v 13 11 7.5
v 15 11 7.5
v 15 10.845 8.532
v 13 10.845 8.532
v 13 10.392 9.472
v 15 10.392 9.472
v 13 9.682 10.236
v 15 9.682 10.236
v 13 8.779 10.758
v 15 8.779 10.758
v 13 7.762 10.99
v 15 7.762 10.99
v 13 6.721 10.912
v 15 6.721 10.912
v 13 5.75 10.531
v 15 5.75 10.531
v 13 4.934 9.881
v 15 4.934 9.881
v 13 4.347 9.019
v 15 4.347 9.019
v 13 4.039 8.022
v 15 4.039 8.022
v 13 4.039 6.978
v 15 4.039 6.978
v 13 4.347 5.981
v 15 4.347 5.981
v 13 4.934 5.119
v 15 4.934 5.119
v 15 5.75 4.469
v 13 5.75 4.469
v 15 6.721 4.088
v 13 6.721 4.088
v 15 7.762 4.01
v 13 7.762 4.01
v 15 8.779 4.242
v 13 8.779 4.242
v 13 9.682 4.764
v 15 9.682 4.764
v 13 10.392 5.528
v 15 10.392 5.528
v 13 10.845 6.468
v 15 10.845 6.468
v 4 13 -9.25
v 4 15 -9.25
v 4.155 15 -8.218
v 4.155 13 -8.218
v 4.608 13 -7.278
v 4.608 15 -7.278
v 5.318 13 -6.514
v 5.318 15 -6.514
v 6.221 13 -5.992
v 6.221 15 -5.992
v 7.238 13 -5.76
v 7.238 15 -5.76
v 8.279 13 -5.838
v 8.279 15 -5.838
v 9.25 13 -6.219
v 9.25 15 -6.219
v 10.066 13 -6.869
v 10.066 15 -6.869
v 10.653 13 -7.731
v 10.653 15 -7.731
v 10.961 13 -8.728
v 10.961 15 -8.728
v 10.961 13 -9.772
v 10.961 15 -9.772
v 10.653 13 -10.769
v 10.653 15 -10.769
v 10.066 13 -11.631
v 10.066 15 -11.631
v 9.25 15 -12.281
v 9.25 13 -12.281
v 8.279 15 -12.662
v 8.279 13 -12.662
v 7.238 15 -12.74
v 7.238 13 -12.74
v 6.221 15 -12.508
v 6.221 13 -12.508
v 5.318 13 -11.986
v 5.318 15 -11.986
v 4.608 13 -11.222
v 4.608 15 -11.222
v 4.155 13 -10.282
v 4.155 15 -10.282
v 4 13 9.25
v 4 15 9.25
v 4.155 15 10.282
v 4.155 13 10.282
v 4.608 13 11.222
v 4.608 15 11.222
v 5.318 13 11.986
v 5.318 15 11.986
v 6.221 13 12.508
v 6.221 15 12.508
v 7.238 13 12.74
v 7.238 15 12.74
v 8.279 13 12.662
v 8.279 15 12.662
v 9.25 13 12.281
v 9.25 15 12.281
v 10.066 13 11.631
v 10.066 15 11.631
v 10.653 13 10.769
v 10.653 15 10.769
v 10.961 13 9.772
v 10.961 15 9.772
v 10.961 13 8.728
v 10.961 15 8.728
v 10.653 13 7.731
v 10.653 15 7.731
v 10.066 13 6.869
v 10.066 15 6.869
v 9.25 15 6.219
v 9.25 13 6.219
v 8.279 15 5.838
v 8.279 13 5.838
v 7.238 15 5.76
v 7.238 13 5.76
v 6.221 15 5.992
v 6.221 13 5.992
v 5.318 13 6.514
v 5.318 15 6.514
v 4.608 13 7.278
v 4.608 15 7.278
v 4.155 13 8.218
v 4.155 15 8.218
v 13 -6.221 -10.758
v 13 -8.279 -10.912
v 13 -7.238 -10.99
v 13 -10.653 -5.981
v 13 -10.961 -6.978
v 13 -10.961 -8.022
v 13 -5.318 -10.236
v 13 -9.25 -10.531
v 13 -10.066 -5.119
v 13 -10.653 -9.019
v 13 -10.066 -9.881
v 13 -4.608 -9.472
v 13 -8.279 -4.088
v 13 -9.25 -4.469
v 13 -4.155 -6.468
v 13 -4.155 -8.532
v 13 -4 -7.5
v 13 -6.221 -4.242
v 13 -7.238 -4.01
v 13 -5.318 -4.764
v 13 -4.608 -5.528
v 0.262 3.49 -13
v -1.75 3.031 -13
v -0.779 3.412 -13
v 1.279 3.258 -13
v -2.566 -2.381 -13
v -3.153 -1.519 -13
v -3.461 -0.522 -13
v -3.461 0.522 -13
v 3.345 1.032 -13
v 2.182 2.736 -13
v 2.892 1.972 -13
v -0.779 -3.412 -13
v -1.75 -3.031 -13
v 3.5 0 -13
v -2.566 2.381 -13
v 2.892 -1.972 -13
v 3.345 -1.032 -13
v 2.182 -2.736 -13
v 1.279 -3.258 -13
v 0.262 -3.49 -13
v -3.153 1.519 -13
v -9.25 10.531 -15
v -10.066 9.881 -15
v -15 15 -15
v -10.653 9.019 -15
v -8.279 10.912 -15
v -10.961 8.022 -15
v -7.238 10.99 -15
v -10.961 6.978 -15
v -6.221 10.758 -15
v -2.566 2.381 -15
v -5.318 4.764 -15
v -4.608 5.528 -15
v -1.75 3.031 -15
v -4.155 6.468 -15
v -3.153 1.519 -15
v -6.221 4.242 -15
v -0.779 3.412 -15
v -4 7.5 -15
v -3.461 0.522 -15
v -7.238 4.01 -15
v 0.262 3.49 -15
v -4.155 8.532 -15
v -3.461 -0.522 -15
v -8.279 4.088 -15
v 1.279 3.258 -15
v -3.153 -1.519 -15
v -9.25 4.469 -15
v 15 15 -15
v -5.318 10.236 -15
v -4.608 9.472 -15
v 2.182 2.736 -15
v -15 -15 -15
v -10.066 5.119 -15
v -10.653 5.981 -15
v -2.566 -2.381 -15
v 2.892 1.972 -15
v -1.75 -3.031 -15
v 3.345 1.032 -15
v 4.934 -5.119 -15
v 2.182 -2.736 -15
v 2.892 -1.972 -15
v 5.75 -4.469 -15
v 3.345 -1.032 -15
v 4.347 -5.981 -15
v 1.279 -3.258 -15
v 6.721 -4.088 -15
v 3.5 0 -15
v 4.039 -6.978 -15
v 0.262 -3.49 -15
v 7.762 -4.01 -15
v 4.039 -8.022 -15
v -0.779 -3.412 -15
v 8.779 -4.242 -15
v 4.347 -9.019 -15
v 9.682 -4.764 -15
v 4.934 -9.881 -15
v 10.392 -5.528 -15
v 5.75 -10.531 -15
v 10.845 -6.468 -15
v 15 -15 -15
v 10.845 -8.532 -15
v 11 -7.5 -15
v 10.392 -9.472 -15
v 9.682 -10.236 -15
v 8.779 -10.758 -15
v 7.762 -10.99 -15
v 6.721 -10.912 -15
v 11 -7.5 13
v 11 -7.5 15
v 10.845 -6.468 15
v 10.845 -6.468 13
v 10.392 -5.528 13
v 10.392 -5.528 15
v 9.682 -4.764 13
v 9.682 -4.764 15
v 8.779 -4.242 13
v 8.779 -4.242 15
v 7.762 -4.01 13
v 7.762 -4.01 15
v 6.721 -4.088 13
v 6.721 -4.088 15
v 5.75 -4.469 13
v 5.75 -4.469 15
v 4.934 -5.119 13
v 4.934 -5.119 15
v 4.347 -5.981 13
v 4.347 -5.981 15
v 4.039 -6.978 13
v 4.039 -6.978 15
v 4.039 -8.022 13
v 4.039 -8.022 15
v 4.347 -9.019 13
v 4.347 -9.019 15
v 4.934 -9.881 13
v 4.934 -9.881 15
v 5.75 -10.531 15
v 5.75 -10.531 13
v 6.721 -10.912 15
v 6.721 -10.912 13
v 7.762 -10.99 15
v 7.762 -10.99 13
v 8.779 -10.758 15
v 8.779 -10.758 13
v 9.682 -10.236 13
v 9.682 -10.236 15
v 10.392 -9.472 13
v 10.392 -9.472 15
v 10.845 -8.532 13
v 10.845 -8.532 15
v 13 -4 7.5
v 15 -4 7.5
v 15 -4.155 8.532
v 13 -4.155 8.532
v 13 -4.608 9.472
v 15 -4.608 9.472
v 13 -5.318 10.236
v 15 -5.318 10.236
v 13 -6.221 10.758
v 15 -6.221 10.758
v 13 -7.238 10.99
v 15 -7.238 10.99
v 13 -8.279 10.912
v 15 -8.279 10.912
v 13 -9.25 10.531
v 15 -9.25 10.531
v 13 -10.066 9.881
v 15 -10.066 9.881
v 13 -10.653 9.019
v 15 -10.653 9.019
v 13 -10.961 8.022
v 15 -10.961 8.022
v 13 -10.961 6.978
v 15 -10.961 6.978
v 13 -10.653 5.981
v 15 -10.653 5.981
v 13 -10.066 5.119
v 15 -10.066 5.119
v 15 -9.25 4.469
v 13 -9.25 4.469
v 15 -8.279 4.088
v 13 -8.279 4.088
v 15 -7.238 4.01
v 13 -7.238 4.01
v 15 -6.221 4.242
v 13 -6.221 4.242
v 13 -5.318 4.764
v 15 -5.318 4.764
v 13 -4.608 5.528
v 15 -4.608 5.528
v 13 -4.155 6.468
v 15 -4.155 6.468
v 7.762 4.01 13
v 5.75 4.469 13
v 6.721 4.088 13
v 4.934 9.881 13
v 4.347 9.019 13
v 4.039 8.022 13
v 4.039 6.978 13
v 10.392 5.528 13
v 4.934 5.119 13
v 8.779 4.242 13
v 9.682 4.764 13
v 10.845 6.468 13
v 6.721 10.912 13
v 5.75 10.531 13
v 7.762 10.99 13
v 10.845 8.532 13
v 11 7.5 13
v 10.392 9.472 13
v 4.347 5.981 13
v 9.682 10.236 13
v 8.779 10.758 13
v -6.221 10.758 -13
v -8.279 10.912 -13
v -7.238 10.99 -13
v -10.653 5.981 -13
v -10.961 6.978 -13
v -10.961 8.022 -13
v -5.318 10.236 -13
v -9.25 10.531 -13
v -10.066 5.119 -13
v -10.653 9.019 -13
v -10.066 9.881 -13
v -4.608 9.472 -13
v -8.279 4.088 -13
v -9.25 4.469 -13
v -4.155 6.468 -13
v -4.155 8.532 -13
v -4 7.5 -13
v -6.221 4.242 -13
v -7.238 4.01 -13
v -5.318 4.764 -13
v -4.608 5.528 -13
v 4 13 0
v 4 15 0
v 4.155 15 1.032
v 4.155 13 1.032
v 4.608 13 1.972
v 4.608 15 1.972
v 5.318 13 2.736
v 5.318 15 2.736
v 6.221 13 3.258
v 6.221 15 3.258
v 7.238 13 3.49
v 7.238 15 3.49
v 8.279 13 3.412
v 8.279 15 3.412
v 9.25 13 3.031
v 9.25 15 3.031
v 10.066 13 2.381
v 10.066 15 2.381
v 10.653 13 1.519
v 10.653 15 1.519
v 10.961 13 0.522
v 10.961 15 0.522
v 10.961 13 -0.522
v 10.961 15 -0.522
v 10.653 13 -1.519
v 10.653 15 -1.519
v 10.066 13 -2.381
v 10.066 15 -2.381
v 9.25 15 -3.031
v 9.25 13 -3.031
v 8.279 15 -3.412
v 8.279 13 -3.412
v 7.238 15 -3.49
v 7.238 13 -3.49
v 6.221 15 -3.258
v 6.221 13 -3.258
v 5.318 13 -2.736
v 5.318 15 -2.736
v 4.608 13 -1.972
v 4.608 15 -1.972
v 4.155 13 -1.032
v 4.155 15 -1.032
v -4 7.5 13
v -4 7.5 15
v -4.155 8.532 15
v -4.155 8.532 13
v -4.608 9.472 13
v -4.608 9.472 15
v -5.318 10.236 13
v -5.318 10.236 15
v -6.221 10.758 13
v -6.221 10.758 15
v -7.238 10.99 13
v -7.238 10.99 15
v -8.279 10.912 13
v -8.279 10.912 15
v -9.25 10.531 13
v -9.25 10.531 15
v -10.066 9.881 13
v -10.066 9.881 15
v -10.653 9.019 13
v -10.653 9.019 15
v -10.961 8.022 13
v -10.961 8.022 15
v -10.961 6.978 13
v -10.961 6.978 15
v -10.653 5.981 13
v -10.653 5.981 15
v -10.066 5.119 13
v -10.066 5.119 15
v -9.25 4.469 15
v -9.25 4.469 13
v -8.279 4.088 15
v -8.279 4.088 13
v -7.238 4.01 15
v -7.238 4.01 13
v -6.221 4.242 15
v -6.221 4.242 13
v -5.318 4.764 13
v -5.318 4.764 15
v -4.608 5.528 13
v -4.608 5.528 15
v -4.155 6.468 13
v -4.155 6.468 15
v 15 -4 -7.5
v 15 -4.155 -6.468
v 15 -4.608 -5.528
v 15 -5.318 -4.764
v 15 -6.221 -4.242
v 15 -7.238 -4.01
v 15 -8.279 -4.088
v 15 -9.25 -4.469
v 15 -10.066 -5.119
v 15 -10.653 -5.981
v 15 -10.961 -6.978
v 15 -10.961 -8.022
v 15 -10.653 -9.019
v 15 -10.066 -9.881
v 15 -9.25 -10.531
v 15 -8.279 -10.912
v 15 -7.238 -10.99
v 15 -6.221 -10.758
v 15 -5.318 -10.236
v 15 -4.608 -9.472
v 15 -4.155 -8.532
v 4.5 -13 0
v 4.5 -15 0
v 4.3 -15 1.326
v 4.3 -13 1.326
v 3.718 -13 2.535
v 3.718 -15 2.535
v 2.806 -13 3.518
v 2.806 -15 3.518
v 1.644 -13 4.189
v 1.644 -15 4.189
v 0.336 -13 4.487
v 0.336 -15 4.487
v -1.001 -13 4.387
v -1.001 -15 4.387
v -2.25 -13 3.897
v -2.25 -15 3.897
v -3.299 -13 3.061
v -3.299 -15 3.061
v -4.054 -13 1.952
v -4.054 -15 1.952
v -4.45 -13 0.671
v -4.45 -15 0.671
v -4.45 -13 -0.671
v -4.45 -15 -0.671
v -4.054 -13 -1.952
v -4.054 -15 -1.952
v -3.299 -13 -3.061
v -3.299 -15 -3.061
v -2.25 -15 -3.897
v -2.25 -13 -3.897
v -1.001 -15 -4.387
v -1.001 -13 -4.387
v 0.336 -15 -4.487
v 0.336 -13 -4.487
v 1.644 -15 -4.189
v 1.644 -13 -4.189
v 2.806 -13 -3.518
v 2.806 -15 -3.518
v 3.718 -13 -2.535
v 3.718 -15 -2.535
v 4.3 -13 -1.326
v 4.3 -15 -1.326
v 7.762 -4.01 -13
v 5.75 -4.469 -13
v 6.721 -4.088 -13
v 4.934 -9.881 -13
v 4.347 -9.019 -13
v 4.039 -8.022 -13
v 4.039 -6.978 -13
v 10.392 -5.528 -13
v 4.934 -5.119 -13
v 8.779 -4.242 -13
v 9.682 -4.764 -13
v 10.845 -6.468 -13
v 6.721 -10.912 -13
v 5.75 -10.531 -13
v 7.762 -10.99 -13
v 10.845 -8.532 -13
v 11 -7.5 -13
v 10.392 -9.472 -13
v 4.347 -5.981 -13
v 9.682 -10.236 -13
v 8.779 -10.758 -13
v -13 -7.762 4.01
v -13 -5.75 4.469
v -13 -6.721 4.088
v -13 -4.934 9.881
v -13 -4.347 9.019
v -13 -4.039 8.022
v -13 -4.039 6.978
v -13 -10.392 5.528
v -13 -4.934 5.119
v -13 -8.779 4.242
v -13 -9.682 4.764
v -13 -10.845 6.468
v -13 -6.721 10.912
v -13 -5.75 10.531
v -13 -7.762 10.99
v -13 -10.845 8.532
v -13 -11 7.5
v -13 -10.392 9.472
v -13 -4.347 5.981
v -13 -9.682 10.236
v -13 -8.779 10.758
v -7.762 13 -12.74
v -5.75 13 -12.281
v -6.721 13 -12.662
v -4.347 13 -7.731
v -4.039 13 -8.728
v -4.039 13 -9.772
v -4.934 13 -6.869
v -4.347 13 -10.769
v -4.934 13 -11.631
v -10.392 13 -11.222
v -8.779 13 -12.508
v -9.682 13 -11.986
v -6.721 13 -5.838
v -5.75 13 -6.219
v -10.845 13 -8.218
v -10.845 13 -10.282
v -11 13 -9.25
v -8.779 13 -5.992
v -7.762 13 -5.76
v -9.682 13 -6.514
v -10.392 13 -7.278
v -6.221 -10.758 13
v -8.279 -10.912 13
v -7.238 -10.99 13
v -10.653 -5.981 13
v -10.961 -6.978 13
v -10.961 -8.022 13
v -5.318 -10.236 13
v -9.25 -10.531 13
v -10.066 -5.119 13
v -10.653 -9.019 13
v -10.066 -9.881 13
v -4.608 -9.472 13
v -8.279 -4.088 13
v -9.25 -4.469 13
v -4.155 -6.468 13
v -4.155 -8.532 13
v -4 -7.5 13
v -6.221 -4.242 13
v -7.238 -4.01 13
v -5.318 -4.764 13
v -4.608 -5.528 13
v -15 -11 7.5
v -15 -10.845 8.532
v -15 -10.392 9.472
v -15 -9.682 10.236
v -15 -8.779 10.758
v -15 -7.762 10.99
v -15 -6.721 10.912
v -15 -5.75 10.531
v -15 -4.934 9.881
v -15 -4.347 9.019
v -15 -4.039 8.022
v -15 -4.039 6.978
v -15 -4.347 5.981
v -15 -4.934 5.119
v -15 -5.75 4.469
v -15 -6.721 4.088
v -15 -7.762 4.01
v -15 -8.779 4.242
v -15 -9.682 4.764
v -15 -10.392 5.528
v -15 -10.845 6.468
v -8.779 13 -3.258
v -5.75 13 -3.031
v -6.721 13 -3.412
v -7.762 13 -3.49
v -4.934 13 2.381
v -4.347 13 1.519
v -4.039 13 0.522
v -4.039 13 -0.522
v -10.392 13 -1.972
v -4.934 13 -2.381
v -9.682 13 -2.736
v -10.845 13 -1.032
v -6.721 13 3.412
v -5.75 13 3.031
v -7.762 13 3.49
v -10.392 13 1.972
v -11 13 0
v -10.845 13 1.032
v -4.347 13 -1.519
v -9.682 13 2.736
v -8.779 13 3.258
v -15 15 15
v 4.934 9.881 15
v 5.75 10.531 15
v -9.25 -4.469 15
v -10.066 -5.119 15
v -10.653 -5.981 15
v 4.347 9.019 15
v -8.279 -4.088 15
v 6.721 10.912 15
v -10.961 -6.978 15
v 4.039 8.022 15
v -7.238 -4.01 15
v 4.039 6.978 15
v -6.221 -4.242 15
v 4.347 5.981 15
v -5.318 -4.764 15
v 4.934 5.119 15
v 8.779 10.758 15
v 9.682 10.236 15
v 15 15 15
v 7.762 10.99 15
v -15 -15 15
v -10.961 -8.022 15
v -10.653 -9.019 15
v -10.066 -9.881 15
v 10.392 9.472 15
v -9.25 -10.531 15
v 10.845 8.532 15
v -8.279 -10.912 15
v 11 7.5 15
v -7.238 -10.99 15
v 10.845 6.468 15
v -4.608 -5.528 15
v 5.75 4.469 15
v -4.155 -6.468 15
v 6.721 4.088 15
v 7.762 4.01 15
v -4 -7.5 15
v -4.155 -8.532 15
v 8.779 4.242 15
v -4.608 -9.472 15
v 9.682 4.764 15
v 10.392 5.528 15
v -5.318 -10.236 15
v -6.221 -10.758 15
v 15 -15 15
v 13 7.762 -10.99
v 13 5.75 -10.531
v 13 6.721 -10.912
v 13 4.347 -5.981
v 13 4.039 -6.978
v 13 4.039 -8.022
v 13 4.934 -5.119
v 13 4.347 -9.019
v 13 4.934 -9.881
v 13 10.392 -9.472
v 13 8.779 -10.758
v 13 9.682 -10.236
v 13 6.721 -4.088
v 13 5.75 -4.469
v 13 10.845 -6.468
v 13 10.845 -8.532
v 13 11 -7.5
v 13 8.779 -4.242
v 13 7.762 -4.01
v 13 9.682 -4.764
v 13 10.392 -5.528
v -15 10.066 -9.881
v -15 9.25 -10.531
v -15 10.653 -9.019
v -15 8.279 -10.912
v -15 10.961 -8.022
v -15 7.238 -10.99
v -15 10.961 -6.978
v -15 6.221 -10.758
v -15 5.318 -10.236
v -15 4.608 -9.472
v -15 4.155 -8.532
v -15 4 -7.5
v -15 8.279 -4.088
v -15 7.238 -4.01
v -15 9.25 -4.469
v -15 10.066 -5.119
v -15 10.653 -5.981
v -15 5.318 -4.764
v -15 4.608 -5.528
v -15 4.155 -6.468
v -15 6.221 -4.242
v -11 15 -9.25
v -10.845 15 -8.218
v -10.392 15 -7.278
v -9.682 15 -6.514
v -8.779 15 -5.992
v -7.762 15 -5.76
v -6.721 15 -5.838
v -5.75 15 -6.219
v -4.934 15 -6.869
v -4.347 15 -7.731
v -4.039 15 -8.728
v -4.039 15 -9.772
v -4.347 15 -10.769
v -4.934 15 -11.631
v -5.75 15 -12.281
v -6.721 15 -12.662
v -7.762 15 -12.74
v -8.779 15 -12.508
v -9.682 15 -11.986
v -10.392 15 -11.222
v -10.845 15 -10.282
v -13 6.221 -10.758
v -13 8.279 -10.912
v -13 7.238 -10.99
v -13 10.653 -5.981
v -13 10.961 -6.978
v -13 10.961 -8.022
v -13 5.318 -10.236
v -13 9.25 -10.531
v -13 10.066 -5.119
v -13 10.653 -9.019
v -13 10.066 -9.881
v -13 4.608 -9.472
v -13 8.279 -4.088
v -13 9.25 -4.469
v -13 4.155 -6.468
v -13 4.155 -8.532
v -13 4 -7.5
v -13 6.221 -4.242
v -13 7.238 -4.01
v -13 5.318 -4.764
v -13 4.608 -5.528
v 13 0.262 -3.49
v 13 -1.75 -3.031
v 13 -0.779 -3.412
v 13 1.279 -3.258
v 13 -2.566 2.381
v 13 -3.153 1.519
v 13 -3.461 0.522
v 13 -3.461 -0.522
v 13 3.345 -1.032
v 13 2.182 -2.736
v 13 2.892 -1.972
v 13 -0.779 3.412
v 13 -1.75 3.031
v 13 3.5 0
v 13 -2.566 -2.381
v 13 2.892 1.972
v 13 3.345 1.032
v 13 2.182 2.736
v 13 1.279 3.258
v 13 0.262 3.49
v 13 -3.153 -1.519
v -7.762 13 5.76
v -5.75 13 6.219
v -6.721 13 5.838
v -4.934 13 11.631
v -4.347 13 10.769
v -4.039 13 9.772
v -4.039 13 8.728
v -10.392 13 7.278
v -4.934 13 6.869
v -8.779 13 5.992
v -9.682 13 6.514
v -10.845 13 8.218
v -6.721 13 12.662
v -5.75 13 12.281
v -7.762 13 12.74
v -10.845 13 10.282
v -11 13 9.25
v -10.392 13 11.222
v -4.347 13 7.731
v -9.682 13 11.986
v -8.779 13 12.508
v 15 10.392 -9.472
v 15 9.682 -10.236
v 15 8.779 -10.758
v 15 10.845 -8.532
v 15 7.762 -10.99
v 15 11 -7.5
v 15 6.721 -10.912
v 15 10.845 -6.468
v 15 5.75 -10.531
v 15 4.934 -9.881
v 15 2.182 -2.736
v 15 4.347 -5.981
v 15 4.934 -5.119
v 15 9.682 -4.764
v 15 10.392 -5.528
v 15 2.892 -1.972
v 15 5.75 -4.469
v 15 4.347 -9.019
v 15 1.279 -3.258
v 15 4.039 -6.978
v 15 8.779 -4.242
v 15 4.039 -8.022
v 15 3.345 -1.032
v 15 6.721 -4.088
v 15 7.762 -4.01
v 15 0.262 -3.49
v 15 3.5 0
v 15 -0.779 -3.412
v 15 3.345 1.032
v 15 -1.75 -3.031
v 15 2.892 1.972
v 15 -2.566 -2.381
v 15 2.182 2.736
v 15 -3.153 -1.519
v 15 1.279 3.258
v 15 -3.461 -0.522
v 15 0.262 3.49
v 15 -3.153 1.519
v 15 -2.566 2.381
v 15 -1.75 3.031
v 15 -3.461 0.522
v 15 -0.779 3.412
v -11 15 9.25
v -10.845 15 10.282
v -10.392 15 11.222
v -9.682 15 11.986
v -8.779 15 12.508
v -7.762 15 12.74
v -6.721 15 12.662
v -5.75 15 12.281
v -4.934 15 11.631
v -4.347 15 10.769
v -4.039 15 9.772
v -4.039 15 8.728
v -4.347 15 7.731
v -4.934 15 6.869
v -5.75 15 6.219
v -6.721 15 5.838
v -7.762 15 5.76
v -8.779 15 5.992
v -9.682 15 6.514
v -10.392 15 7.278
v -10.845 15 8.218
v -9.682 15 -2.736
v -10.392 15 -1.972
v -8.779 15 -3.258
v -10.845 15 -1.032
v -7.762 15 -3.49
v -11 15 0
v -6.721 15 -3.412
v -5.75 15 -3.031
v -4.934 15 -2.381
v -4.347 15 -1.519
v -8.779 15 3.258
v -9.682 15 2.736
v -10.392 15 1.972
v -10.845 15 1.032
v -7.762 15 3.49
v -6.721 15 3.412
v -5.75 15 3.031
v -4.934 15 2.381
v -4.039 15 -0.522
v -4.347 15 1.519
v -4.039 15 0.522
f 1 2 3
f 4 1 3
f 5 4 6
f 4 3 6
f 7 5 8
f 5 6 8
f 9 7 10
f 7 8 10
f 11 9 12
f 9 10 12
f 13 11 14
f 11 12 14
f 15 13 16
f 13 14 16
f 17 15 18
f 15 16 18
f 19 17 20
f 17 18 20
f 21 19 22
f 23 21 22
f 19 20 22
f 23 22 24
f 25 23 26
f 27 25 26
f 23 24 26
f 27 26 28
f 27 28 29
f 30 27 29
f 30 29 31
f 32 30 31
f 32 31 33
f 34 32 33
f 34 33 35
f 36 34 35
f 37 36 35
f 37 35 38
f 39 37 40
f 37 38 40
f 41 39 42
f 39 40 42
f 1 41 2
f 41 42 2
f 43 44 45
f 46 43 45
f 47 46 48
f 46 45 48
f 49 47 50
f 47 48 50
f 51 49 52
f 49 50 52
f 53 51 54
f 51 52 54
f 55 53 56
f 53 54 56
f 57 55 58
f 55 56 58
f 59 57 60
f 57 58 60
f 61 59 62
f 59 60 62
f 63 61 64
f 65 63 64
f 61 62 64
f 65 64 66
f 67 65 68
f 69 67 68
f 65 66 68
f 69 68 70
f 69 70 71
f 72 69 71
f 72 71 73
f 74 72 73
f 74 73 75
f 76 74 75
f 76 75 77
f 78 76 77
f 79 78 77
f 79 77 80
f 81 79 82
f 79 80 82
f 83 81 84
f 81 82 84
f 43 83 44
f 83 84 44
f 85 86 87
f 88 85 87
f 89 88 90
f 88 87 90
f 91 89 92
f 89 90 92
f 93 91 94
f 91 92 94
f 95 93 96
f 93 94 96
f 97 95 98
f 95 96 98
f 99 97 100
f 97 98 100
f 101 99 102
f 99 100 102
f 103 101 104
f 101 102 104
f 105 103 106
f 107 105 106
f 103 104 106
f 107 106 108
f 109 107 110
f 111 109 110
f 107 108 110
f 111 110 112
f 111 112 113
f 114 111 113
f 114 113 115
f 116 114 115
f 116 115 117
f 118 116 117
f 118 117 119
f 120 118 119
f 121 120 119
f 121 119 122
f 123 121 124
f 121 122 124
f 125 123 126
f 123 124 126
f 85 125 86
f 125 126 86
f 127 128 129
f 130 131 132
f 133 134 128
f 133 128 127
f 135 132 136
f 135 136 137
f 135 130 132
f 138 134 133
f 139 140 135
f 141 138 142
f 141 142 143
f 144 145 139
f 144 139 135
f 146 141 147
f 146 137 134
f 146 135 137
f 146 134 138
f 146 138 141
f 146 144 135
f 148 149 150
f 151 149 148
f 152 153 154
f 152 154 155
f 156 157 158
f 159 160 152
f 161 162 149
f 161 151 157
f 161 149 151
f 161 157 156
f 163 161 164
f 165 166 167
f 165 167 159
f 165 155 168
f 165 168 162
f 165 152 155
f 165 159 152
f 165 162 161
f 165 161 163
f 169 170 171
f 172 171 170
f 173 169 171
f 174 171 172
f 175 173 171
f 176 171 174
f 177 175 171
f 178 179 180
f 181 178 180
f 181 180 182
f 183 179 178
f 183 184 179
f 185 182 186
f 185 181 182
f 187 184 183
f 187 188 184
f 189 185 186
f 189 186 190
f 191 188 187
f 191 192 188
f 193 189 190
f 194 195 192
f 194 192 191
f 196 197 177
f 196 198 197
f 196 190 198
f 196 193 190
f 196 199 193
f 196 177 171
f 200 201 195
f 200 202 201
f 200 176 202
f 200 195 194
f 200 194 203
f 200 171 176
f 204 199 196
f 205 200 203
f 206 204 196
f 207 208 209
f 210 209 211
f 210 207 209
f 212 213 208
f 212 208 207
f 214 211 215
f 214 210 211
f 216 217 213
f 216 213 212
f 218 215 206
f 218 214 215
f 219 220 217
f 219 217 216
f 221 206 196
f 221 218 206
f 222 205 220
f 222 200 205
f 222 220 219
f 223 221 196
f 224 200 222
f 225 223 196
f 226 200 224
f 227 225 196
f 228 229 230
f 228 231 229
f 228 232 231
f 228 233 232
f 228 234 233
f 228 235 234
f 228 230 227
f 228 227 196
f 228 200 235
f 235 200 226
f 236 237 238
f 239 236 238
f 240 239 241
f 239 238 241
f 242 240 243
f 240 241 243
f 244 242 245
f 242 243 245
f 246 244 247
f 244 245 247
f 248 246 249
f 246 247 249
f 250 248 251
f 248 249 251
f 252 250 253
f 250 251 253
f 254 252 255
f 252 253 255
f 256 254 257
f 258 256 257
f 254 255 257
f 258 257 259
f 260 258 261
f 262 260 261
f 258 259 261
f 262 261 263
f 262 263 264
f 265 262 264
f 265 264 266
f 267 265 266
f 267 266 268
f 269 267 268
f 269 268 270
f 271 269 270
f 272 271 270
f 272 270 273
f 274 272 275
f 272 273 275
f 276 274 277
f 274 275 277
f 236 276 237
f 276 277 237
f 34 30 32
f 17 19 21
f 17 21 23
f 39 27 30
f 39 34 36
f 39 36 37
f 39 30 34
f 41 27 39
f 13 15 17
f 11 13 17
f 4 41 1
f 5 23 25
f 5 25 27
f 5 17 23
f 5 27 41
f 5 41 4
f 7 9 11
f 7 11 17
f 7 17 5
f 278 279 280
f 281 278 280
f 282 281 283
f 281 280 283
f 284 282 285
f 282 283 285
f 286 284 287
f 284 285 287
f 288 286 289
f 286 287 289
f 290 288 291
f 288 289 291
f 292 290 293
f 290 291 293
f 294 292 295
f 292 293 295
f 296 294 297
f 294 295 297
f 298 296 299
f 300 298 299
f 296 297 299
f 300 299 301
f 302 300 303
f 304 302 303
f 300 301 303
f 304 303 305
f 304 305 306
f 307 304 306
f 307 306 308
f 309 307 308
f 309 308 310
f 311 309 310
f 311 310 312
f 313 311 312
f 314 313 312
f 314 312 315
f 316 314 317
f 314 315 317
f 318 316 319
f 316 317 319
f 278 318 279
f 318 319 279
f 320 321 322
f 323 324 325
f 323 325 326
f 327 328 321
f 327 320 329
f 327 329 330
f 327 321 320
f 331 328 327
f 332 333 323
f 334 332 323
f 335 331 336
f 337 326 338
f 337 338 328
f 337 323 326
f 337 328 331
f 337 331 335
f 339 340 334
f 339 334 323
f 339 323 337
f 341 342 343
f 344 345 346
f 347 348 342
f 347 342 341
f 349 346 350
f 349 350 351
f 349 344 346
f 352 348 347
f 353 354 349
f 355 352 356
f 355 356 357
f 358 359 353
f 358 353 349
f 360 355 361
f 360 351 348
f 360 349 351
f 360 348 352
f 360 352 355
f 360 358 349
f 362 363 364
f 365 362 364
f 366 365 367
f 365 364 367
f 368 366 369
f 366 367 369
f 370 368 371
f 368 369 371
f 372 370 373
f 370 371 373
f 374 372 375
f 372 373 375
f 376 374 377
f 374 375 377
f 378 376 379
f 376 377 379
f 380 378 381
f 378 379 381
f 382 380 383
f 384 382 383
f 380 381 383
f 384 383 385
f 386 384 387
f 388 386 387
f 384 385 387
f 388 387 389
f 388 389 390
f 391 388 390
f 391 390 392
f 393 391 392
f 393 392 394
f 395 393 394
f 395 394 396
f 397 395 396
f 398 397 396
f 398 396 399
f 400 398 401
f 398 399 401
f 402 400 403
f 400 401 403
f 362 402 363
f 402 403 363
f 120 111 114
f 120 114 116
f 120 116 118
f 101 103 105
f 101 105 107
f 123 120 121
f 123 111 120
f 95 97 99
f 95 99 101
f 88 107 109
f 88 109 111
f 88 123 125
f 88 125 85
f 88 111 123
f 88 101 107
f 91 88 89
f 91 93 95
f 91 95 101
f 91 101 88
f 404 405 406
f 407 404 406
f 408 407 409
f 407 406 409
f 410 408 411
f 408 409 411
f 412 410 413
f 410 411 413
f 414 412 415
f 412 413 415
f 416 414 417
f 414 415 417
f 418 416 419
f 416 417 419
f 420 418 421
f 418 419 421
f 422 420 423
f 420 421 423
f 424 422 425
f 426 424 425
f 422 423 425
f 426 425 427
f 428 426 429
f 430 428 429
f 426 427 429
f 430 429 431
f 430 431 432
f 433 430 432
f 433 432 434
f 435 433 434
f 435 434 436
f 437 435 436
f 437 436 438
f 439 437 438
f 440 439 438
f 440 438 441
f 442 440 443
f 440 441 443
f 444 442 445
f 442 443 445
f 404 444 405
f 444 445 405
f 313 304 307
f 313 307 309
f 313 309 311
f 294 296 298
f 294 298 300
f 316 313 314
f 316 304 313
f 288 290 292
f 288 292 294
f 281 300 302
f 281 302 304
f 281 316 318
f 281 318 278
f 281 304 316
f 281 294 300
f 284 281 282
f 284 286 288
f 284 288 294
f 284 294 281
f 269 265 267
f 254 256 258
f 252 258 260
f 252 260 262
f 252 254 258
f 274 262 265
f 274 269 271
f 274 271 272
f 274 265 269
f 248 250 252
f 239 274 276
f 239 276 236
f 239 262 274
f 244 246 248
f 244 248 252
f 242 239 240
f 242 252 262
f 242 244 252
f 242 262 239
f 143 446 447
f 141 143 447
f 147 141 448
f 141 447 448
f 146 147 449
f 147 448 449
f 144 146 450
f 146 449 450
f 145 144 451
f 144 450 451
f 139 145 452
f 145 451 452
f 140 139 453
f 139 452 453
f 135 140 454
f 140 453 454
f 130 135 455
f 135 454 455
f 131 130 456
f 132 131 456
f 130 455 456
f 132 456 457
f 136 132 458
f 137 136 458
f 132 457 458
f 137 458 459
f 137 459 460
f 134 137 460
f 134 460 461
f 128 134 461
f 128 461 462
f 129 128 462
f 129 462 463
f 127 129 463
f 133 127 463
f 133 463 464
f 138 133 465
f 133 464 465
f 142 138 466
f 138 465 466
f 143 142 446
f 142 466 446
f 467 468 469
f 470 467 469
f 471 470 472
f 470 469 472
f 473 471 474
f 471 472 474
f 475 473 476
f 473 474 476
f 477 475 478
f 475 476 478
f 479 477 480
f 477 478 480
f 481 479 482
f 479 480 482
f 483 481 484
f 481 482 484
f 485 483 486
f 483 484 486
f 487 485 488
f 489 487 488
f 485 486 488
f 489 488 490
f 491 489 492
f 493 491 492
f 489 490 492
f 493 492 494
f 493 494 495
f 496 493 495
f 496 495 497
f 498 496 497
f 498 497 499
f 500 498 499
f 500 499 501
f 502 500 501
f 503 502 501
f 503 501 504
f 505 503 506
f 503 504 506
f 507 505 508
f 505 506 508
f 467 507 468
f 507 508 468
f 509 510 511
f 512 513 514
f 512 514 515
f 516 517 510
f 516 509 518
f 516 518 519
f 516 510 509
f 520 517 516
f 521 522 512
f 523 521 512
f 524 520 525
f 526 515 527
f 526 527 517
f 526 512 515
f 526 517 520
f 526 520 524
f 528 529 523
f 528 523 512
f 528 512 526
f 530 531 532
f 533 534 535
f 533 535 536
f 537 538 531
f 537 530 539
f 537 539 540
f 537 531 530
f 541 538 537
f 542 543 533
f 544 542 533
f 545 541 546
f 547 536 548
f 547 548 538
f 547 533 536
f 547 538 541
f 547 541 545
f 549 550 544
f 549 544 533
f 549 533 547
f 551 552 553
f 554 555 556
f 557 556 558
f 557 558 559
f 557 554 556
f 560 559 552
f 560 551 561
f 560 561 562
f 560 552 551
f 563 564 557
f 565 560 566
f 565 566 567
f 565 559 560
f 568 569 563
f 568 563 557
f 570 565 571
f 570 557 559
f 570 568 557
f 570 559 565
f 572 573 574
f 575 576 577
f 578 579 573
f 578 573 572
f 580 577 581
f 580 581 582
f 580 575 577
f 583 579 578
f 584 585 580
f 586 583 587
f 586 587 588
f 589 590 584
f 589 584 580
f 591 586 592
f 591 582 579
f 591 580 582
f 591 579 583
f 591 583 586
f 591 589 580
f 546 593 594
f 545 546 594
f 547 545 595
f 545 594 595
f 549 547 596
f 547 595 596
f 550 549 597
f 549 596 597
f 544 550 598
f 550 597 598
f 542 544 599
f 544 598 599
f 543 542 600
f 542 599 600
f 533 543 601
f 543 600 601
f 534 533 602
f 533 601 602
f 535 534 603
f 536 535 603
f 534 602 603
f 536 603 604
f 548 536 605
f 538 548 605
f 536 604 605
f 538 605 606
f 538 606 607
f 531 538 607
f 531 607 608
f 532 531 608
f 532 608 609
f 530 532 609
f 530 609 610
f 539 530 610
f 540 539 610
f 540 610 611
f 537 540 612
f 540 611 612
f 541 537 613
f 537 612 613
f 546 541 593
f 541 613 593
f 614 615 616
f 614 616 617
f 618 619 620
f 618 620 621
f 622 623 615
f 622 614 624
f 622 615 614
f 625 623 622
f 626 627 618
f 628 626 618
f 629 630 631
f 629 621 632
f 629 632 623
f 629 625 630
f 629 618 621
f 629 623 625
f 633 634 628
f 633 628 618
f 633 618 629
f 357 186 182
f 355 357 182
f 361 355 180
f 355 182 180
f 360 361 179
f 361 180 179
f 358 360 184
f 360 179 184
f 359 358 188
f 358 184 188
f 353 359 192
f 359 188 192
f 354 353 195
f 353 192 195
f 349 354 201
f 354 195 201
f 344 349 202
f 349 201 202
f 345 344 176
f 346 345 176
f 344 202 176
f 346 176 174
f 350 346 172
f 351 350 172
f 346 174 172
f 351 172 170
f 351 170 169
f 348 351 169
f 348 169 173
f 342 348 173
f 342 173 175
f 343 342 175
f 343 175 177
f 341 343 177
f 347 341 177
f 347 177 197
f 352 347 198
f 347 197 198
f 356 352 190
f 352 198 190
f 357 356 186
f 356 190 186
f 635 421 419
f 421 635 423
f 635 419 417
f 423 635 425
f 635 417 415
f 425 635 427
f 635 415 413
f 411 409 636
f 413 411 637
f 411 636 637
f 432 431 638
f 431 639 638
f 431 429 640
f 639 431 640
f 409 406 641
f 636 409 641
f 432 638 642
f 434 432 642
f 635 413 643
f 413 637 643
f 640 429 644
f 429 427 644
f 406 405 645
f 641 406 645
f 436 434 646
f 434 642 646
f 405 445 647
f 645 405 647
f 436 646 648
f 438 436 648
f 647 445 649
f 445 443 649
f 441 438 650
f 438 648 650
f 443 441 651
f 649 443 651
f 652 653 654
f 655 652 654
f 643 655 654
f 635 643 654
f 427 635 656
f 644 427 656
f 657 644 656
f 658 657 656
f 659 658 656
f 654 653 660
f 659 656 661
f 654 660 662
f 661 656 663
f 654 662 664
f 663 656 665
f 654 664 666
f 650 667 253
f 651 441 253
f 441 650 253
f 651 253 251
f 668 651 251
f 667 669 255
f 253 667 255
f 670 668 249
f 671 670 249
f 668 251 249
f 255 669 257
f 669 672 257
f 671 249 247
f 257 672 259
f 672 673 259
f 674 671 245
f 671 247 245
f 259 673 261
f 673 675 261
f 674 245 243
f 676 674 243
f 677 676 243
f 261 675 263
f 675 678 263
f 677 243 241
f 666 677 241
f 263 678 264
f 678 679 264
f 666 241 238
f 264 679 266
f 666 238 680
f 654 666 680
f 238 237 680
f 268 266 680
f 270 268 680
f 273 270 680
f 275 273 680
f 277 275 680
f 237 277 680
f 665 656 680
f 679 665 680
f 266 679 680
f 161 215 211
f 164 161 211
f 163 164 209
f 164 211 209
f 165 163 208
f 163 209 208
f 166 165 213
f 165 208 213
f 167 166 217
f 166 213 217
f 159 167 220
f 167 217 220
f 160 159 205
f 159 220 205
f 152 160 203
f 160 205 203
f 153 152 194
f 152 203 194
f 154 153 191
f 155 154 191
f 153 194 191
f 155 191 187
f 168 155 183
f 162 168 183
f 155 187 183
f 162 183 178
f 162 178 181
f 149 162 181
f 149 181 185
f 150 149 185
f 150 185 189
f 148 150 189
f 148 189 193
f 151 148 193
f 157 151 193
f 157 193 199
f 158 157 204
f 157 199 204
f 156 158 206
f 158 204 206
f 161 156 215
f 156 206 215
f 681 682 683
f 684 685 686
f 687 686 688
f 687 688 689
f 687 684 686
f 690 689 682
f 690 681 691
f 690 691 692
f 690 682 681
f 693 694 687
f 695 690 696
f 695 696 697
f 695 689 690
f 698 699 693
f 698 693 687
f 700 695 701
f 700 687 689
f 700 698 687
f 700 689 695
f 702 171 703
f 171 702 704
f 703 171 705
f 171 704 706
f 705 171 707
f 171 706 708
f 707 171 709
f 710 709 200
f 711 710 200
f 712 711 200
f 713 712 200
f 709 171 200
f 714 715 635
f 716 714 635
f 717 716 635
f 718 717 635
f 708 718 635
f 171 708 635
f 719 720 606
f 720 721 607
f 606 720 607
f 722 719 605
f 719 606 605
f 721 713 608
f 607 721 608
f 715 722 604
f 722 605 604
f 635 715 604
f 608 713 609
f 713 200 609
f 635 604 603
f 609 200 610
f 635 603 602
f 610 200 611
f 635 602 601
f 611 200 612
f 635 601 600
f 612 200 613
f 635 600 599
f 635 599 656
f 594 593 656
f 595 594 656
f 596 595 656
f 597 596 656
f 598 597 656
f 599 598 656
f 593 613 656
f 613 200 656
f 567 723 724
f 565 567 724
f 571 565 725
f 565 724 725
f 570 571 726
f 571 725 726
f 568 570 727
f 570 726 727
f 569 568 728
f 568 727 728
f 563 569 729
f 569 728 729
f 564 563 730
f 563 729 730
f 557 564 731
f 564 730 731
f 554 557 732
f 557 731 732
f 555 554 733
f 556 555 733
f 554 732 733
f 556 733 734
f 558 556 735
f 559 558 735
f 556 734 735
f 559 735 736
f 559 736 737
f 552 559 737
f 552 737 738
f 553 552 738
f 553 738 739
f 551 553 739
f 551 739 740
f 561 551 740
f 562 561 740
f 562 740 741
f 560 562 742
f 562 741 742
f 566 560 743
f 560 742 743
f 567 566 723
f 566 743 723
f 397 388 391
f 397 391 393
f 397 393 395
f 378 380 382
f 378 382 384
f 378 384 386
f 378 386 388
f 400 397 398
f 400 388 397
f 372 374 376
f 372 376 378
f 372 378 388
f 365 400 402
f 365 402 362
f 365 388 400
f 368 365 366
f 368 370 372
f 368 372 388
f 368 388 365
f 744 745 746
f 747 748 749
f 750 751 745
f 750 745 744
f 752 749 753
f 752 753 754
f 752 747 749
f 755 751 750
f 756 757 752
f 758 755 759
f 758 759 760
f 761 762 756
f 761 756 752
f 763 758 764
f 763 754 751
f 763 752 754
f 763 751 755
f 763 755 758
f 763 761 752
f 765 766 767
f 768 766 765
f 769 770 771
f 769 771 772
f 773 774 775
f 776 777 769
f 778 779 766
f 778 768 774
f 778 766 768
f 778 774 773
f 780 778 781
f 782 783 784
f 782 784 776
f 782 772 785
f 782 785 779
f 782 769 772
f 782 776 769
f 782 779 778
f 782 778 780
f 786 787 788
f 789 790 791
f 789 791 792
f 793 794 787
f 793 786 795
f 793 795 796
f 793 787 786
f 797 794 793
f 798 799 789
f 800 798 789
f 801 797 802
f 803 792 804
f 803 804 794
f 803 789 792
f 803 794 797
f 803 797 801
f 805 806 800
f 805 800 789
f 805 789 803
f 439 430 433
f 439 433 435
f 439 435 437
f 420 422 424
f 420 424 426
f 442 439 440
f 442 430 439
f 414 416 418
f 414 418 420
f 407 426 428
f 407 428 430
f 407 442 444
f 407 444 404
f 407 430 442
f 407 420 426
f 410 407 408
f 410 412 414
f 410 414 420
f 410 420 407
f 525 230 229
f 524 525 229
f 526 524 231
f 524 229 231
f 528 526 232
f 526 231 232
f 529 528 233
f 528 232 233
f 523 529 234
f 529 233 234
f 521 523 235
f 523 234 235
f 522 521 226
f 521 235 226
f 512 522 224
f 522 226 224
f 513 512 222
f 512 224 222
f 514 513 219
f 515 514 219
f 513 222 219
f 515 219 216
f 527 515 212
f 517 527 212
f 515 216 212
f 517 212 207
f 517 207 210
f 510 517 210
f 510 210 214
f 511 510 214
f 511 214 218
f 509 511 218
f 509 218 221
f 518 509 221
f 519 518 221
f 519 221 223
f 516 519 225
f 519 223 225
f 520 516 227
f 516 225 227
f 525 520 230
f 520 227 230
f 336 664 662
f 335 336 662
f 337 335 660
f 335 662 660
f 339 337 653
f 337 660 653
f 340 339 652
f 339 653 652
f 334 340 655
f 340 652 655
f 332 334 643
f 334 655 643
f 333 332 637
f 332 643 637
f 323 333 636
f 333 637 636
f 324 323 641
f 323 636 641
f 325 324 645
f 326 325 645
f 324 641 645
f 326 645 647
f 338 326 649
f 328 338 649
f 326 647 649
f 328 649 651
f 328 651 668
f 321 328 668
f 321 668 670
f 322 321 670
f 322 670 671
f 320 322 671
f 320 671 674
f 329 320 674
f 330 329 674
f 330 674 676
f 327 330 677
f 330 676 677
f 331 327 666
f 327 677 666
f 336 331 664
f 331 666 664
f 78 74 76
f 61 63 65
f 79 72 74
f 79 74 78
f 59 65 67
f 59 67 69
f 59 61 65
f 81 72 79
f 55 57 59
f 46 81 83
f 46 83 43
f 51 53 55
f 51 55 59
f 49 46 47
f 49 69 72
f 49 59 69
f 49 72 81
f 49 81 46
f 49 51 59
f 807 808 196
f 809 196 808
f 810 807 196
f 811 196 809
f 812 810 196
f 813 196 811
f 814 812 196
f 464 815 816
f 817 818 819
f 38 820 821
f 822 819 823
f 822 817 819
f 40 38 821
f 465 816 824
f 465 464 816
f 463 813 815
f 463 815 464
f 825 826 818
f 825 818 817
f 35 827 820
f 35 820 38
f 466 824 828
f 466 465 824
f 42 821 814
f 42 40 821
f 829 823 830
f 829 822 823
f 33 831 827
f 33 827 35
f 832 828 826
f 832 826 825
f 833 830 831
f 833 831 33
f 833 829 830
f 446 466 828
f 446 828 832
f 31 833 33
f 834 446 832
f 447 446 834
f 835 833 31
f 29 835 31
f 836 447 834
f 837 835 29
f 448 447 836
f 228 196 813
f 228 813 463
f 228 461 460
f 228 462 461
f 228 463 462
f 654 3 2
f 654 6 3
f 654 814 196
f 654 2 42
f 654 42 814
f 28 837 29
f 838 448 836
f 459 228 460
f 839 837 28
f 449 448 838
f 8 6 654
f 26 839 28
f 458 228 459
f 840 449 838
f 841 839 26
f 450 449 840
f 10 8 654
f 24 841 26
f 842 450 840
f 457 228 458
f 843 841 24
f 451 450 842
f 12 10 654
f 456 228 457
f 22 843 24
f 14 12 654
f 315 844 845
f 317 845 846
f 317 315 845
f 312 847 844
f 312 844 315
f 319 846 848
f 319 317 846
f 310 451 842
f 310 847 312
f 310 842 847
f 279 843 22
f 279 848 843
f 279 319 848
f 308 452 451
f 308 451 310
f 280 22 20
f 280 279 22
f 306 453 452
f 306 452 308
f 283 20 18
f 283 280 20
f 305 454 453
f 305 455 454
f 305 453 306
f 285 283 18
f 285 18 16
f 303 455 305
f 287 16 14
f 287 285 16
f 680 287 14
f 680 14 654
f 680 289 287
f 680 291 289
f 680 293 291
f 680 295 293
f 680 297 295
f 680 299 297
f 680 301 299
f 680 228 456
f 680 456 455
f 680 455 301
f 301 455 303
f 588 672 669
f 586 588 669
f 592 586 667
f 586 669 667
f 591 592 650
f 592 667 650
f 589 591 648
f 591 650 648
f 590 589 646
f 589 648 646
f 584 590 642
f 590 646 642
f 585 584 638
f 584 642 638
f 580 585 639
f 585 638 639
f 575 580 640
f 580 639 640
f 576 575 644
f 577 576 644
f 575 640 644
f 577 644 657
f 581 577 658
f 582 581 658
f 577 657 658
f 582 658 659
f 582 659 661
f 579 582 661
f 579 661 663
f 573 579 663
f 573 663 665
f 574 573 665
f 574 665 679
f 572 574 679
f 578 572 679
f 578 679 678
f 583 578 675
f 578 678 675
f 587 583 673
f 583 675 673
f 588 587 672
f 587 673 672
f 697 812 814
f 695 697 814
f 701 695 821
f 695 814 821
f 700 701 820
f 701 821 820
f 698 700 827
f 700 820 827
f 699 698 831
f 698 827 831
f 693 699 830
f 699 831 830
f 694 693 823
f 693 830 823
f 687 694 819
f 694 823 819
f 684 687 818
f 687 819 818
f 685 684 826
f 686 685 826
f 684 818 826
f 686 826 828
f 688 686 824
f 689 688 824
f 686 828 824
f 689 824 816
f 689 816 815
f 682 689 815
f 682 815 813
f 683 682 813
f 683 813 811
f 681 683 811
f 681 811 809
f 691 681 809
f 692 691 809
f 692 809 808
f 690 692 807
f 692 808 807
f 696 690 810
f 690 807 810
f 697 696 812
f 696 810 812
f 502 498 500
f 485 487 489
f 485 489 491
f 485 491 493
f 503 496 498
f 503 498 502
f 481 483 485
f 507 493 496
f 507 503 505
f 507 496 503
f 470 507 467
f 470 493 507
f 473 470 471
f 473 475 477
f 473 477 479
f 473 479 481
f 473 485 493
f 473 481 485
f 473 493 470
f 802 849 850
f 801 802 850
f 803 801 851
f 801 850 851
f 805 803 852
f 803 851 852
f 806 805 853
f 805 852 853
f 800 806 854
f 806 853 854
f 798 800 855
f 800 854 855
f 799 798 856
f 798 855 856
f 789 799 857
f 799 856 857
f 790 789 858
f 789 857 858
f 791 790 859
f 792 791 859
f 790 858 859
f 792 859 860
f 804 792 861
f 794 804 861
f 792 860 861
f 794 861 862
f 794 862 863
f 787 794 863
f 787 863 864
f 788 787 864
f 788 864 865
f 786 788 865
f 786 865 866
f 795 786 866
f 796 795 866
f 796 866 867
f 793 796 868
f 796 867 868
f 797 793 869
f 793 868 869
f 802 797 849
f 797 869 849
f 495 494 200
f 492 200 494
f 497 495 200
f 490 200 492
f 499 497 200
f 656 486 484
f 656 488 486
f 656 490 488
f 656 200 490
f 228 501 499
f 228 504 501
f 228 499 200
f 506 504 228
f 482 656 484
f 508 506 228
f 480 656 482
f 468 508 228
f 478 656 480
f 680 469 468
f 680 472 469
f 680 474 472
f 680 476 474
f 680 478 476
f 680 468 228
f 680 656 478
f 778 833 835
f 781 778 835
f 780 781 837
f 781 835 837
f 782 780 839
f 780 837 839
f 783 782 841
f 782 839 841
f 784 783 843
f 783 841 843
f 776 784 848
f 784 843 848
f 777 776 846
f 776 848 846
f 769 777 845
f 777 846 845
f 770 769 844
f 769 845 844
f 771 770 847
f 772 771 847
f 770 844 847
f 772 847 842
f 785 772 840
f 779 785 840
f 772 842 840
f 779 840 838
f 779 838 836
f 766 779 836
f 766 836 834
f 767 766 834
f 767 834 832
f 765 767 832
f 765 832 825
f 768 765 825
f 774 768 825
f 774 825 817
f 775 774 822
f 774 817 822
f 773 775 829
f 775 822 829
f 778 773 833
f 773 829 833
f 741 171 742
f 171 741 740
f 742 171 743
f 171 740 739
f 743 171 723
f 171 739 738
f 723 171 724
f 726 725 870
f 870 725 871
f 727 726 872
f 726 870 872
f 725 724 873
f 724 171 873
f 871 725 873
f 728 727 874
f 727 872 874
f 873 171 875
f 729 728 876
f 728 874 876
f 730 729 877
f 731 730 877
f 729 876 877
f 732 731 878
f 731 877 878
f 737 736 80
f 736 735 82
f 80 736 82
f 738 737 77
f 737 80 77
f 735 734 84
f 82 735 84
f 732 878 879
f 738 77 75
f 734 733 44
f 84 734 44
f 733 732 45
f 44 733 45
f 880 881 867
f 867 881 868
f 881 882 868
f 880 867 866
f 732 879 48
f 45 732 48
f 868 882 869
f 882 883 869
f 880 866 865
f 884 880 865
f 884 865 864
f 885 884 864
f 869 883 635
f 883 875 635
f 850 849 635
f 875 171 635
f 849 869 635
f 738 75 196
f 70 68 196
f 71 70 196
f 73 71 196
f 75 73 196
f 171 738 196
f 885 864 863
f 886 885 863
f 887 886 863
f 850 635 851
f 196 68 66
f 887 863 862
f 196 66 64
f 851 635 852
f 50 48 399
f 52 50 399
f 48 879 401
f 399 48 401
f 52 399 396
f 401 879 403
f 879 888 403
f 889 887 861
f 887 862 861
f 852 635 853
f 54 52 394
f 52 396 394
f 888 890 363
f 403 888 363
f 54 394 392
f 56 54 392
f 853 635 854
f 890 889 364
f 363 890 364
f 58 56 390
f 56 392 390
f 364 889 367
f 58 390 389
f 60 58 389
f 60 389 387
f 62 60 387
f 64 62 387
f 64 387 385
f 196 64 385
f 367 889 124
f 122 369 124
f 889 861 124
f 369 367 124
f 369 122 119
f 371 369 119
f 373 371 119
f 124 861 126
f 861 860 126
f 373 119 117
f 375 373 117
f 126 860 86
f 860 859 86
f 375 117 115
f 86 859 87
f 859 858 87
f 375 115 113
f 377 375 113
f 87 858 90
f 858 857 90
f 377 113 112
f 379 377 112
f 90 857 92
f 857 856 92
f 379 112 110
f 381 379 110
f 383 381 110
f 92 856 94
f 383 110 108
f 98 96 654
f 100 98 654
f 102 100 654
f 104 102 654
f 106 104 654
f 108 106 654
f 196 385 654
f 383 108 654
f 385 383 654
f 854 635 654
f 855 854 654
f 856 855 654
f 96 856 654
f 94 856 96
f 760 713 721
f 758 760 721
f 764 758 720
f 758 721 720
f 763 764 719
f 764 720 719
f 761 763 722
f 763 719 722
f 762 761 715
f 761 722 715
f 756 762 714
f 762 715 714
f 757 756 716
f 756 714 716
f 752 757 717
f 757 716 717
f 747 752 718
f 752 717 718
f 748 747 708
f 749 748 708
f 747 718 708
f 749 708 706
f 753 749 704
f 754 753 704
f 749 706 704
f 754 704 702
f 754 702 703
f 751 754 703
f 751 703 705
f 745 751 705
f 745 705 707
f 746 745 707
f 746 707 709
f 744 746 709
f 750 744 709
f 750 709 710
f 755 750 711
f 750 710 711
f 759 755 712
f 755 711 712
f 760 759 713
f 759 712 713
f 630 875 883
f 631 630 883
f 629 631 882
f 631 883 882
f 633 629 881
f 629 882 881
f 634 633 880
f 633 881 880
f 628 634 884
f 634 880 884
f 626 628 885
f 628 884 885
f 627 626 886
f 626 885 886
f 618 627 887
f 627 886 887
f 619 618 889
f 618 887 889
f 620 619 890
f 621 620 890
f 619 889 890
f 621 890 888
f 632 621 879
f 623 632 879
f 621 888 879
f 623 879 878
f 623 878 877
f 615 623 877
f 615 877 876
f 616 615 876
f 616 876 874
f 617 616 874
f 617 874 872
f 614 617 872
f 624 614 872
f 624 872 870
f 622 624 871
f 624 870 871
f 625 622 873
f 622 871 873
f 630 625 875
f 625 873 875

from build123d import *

# Parameters (mm, degrees)
F0_W      = 30
F0_H      = 30
F1_DEPTH  = 15
F2_R      = 4.5
F3_DEPTH  = 2
F5_R      = 3.5
F6_DEPTH  = 2
F7_R      = 3.5
F8_DEPTH  = 2
F9_R      = 3.5
F10_DEPTH = 2
F11_R     = 3.5
F12_DEPTH = 2
F13_R     = 3.5
F14_DEPTH = 2


with BuildPart() as f1:
    # F0 (on Front) → F1 (new body, symmetric)
    with BuildSketch(Plane.XZ):
        Rectangle(F0_W, F0_H)
    extrude(amount=F1_DEPTH, both=True)

    # F2 (on face) → F3 (cut)
    with BuildSketch(Plane.XZ.offset(15)):
        Circle(F2_R)
    extrude(amount=-F3_DEPTH, mode=Mode.SUBTRACT)

    # F5 (on face) → F6 (cut)
    with BuildSketch(Plane(origin=(0, 15, 0), x_dir=(-1, 0, 0), z_dir=(0, 1, 0))):
        with Locations((-7.5, 0)):
            Circle(F5_R)
        with Locations((-7.5, 9.25)):
            Circle(F5_R)
        with Locations((-7.5, -9.25)):
            Circle(F5_R)
        with Locations((7.5, 0)):
            Circle(F5_R)
        with Locations((7.5, -9.25)):
            Circle(F5_R)
        with Locations((7.5, 9.25)):
            Circle(F5_R)
    extrude(amount=-F6_DEPTH, mode=Mode.SUBTRACT)

    # F7 (on face) → F8 (cut)
    with BuildSketch(Plane.XY.offset(15)):
        with Locations((-7.5, 7.5)):
            Circle(F7_R)
        with Locations((7.5, 7.5)):
            Circle(F7_R)
        with Locations((7.5, -7.5)):
            Circle(F7_R)
        with Locations((-7.5, -7.5)):
            Circle(F7_R)
    extrude(amount=-F8_DEPTH, mode=Mode.SUBTRACT)

    # F9 (on face) → F10 (cut)
    with BuildSketch(Plane(origin=(0, 0, -15), x_dir=(1, 0, 0), z_dir=(0, 0, -1))):
        Circle(F9_R)
        with Locations((-7.5, -7.5)):
            Circle(F9_R)
        with Locations((7.5, 7.5)):
            Circle(F9_R)
    extrude(amount=-F10_DEPTH, mode=Mode.SUBTRACT)

    # F11 (on face) → F12 (cut)
    with BuildSketch(Plane.YZ.offset(15)):
        with Locations((-7.5, 7.5)):
            Circle(F11_R)
        with Locations((7.5, 7.5)):
            Circle(F11_R)
        with Locations((7.5, -7.5)):
            Circle(F11_R)
        with Locations((-7.5, -7.5)):
            Circle(F11_R)
        Circle(F11_R)
    extrude(amount=-F12_DEPTH, mode=Mode.SUBTRACT)

    # F13 (on face) → F14 (cut)
    with BuildSketch(Plane(origin=(-15, 0, 0), x_dir=(0, -1, 0), z_dir=(-1, 0, 0))):
        with Locations((-7.5, -7.5)):
            Circle(F13_R)
        with Locations((7.5, 7.5)):
            Circle(F13_R)
    extrude(amount=-F14_DEPTH, mode=Mode.SUBTRACT)


solid = f1.part
